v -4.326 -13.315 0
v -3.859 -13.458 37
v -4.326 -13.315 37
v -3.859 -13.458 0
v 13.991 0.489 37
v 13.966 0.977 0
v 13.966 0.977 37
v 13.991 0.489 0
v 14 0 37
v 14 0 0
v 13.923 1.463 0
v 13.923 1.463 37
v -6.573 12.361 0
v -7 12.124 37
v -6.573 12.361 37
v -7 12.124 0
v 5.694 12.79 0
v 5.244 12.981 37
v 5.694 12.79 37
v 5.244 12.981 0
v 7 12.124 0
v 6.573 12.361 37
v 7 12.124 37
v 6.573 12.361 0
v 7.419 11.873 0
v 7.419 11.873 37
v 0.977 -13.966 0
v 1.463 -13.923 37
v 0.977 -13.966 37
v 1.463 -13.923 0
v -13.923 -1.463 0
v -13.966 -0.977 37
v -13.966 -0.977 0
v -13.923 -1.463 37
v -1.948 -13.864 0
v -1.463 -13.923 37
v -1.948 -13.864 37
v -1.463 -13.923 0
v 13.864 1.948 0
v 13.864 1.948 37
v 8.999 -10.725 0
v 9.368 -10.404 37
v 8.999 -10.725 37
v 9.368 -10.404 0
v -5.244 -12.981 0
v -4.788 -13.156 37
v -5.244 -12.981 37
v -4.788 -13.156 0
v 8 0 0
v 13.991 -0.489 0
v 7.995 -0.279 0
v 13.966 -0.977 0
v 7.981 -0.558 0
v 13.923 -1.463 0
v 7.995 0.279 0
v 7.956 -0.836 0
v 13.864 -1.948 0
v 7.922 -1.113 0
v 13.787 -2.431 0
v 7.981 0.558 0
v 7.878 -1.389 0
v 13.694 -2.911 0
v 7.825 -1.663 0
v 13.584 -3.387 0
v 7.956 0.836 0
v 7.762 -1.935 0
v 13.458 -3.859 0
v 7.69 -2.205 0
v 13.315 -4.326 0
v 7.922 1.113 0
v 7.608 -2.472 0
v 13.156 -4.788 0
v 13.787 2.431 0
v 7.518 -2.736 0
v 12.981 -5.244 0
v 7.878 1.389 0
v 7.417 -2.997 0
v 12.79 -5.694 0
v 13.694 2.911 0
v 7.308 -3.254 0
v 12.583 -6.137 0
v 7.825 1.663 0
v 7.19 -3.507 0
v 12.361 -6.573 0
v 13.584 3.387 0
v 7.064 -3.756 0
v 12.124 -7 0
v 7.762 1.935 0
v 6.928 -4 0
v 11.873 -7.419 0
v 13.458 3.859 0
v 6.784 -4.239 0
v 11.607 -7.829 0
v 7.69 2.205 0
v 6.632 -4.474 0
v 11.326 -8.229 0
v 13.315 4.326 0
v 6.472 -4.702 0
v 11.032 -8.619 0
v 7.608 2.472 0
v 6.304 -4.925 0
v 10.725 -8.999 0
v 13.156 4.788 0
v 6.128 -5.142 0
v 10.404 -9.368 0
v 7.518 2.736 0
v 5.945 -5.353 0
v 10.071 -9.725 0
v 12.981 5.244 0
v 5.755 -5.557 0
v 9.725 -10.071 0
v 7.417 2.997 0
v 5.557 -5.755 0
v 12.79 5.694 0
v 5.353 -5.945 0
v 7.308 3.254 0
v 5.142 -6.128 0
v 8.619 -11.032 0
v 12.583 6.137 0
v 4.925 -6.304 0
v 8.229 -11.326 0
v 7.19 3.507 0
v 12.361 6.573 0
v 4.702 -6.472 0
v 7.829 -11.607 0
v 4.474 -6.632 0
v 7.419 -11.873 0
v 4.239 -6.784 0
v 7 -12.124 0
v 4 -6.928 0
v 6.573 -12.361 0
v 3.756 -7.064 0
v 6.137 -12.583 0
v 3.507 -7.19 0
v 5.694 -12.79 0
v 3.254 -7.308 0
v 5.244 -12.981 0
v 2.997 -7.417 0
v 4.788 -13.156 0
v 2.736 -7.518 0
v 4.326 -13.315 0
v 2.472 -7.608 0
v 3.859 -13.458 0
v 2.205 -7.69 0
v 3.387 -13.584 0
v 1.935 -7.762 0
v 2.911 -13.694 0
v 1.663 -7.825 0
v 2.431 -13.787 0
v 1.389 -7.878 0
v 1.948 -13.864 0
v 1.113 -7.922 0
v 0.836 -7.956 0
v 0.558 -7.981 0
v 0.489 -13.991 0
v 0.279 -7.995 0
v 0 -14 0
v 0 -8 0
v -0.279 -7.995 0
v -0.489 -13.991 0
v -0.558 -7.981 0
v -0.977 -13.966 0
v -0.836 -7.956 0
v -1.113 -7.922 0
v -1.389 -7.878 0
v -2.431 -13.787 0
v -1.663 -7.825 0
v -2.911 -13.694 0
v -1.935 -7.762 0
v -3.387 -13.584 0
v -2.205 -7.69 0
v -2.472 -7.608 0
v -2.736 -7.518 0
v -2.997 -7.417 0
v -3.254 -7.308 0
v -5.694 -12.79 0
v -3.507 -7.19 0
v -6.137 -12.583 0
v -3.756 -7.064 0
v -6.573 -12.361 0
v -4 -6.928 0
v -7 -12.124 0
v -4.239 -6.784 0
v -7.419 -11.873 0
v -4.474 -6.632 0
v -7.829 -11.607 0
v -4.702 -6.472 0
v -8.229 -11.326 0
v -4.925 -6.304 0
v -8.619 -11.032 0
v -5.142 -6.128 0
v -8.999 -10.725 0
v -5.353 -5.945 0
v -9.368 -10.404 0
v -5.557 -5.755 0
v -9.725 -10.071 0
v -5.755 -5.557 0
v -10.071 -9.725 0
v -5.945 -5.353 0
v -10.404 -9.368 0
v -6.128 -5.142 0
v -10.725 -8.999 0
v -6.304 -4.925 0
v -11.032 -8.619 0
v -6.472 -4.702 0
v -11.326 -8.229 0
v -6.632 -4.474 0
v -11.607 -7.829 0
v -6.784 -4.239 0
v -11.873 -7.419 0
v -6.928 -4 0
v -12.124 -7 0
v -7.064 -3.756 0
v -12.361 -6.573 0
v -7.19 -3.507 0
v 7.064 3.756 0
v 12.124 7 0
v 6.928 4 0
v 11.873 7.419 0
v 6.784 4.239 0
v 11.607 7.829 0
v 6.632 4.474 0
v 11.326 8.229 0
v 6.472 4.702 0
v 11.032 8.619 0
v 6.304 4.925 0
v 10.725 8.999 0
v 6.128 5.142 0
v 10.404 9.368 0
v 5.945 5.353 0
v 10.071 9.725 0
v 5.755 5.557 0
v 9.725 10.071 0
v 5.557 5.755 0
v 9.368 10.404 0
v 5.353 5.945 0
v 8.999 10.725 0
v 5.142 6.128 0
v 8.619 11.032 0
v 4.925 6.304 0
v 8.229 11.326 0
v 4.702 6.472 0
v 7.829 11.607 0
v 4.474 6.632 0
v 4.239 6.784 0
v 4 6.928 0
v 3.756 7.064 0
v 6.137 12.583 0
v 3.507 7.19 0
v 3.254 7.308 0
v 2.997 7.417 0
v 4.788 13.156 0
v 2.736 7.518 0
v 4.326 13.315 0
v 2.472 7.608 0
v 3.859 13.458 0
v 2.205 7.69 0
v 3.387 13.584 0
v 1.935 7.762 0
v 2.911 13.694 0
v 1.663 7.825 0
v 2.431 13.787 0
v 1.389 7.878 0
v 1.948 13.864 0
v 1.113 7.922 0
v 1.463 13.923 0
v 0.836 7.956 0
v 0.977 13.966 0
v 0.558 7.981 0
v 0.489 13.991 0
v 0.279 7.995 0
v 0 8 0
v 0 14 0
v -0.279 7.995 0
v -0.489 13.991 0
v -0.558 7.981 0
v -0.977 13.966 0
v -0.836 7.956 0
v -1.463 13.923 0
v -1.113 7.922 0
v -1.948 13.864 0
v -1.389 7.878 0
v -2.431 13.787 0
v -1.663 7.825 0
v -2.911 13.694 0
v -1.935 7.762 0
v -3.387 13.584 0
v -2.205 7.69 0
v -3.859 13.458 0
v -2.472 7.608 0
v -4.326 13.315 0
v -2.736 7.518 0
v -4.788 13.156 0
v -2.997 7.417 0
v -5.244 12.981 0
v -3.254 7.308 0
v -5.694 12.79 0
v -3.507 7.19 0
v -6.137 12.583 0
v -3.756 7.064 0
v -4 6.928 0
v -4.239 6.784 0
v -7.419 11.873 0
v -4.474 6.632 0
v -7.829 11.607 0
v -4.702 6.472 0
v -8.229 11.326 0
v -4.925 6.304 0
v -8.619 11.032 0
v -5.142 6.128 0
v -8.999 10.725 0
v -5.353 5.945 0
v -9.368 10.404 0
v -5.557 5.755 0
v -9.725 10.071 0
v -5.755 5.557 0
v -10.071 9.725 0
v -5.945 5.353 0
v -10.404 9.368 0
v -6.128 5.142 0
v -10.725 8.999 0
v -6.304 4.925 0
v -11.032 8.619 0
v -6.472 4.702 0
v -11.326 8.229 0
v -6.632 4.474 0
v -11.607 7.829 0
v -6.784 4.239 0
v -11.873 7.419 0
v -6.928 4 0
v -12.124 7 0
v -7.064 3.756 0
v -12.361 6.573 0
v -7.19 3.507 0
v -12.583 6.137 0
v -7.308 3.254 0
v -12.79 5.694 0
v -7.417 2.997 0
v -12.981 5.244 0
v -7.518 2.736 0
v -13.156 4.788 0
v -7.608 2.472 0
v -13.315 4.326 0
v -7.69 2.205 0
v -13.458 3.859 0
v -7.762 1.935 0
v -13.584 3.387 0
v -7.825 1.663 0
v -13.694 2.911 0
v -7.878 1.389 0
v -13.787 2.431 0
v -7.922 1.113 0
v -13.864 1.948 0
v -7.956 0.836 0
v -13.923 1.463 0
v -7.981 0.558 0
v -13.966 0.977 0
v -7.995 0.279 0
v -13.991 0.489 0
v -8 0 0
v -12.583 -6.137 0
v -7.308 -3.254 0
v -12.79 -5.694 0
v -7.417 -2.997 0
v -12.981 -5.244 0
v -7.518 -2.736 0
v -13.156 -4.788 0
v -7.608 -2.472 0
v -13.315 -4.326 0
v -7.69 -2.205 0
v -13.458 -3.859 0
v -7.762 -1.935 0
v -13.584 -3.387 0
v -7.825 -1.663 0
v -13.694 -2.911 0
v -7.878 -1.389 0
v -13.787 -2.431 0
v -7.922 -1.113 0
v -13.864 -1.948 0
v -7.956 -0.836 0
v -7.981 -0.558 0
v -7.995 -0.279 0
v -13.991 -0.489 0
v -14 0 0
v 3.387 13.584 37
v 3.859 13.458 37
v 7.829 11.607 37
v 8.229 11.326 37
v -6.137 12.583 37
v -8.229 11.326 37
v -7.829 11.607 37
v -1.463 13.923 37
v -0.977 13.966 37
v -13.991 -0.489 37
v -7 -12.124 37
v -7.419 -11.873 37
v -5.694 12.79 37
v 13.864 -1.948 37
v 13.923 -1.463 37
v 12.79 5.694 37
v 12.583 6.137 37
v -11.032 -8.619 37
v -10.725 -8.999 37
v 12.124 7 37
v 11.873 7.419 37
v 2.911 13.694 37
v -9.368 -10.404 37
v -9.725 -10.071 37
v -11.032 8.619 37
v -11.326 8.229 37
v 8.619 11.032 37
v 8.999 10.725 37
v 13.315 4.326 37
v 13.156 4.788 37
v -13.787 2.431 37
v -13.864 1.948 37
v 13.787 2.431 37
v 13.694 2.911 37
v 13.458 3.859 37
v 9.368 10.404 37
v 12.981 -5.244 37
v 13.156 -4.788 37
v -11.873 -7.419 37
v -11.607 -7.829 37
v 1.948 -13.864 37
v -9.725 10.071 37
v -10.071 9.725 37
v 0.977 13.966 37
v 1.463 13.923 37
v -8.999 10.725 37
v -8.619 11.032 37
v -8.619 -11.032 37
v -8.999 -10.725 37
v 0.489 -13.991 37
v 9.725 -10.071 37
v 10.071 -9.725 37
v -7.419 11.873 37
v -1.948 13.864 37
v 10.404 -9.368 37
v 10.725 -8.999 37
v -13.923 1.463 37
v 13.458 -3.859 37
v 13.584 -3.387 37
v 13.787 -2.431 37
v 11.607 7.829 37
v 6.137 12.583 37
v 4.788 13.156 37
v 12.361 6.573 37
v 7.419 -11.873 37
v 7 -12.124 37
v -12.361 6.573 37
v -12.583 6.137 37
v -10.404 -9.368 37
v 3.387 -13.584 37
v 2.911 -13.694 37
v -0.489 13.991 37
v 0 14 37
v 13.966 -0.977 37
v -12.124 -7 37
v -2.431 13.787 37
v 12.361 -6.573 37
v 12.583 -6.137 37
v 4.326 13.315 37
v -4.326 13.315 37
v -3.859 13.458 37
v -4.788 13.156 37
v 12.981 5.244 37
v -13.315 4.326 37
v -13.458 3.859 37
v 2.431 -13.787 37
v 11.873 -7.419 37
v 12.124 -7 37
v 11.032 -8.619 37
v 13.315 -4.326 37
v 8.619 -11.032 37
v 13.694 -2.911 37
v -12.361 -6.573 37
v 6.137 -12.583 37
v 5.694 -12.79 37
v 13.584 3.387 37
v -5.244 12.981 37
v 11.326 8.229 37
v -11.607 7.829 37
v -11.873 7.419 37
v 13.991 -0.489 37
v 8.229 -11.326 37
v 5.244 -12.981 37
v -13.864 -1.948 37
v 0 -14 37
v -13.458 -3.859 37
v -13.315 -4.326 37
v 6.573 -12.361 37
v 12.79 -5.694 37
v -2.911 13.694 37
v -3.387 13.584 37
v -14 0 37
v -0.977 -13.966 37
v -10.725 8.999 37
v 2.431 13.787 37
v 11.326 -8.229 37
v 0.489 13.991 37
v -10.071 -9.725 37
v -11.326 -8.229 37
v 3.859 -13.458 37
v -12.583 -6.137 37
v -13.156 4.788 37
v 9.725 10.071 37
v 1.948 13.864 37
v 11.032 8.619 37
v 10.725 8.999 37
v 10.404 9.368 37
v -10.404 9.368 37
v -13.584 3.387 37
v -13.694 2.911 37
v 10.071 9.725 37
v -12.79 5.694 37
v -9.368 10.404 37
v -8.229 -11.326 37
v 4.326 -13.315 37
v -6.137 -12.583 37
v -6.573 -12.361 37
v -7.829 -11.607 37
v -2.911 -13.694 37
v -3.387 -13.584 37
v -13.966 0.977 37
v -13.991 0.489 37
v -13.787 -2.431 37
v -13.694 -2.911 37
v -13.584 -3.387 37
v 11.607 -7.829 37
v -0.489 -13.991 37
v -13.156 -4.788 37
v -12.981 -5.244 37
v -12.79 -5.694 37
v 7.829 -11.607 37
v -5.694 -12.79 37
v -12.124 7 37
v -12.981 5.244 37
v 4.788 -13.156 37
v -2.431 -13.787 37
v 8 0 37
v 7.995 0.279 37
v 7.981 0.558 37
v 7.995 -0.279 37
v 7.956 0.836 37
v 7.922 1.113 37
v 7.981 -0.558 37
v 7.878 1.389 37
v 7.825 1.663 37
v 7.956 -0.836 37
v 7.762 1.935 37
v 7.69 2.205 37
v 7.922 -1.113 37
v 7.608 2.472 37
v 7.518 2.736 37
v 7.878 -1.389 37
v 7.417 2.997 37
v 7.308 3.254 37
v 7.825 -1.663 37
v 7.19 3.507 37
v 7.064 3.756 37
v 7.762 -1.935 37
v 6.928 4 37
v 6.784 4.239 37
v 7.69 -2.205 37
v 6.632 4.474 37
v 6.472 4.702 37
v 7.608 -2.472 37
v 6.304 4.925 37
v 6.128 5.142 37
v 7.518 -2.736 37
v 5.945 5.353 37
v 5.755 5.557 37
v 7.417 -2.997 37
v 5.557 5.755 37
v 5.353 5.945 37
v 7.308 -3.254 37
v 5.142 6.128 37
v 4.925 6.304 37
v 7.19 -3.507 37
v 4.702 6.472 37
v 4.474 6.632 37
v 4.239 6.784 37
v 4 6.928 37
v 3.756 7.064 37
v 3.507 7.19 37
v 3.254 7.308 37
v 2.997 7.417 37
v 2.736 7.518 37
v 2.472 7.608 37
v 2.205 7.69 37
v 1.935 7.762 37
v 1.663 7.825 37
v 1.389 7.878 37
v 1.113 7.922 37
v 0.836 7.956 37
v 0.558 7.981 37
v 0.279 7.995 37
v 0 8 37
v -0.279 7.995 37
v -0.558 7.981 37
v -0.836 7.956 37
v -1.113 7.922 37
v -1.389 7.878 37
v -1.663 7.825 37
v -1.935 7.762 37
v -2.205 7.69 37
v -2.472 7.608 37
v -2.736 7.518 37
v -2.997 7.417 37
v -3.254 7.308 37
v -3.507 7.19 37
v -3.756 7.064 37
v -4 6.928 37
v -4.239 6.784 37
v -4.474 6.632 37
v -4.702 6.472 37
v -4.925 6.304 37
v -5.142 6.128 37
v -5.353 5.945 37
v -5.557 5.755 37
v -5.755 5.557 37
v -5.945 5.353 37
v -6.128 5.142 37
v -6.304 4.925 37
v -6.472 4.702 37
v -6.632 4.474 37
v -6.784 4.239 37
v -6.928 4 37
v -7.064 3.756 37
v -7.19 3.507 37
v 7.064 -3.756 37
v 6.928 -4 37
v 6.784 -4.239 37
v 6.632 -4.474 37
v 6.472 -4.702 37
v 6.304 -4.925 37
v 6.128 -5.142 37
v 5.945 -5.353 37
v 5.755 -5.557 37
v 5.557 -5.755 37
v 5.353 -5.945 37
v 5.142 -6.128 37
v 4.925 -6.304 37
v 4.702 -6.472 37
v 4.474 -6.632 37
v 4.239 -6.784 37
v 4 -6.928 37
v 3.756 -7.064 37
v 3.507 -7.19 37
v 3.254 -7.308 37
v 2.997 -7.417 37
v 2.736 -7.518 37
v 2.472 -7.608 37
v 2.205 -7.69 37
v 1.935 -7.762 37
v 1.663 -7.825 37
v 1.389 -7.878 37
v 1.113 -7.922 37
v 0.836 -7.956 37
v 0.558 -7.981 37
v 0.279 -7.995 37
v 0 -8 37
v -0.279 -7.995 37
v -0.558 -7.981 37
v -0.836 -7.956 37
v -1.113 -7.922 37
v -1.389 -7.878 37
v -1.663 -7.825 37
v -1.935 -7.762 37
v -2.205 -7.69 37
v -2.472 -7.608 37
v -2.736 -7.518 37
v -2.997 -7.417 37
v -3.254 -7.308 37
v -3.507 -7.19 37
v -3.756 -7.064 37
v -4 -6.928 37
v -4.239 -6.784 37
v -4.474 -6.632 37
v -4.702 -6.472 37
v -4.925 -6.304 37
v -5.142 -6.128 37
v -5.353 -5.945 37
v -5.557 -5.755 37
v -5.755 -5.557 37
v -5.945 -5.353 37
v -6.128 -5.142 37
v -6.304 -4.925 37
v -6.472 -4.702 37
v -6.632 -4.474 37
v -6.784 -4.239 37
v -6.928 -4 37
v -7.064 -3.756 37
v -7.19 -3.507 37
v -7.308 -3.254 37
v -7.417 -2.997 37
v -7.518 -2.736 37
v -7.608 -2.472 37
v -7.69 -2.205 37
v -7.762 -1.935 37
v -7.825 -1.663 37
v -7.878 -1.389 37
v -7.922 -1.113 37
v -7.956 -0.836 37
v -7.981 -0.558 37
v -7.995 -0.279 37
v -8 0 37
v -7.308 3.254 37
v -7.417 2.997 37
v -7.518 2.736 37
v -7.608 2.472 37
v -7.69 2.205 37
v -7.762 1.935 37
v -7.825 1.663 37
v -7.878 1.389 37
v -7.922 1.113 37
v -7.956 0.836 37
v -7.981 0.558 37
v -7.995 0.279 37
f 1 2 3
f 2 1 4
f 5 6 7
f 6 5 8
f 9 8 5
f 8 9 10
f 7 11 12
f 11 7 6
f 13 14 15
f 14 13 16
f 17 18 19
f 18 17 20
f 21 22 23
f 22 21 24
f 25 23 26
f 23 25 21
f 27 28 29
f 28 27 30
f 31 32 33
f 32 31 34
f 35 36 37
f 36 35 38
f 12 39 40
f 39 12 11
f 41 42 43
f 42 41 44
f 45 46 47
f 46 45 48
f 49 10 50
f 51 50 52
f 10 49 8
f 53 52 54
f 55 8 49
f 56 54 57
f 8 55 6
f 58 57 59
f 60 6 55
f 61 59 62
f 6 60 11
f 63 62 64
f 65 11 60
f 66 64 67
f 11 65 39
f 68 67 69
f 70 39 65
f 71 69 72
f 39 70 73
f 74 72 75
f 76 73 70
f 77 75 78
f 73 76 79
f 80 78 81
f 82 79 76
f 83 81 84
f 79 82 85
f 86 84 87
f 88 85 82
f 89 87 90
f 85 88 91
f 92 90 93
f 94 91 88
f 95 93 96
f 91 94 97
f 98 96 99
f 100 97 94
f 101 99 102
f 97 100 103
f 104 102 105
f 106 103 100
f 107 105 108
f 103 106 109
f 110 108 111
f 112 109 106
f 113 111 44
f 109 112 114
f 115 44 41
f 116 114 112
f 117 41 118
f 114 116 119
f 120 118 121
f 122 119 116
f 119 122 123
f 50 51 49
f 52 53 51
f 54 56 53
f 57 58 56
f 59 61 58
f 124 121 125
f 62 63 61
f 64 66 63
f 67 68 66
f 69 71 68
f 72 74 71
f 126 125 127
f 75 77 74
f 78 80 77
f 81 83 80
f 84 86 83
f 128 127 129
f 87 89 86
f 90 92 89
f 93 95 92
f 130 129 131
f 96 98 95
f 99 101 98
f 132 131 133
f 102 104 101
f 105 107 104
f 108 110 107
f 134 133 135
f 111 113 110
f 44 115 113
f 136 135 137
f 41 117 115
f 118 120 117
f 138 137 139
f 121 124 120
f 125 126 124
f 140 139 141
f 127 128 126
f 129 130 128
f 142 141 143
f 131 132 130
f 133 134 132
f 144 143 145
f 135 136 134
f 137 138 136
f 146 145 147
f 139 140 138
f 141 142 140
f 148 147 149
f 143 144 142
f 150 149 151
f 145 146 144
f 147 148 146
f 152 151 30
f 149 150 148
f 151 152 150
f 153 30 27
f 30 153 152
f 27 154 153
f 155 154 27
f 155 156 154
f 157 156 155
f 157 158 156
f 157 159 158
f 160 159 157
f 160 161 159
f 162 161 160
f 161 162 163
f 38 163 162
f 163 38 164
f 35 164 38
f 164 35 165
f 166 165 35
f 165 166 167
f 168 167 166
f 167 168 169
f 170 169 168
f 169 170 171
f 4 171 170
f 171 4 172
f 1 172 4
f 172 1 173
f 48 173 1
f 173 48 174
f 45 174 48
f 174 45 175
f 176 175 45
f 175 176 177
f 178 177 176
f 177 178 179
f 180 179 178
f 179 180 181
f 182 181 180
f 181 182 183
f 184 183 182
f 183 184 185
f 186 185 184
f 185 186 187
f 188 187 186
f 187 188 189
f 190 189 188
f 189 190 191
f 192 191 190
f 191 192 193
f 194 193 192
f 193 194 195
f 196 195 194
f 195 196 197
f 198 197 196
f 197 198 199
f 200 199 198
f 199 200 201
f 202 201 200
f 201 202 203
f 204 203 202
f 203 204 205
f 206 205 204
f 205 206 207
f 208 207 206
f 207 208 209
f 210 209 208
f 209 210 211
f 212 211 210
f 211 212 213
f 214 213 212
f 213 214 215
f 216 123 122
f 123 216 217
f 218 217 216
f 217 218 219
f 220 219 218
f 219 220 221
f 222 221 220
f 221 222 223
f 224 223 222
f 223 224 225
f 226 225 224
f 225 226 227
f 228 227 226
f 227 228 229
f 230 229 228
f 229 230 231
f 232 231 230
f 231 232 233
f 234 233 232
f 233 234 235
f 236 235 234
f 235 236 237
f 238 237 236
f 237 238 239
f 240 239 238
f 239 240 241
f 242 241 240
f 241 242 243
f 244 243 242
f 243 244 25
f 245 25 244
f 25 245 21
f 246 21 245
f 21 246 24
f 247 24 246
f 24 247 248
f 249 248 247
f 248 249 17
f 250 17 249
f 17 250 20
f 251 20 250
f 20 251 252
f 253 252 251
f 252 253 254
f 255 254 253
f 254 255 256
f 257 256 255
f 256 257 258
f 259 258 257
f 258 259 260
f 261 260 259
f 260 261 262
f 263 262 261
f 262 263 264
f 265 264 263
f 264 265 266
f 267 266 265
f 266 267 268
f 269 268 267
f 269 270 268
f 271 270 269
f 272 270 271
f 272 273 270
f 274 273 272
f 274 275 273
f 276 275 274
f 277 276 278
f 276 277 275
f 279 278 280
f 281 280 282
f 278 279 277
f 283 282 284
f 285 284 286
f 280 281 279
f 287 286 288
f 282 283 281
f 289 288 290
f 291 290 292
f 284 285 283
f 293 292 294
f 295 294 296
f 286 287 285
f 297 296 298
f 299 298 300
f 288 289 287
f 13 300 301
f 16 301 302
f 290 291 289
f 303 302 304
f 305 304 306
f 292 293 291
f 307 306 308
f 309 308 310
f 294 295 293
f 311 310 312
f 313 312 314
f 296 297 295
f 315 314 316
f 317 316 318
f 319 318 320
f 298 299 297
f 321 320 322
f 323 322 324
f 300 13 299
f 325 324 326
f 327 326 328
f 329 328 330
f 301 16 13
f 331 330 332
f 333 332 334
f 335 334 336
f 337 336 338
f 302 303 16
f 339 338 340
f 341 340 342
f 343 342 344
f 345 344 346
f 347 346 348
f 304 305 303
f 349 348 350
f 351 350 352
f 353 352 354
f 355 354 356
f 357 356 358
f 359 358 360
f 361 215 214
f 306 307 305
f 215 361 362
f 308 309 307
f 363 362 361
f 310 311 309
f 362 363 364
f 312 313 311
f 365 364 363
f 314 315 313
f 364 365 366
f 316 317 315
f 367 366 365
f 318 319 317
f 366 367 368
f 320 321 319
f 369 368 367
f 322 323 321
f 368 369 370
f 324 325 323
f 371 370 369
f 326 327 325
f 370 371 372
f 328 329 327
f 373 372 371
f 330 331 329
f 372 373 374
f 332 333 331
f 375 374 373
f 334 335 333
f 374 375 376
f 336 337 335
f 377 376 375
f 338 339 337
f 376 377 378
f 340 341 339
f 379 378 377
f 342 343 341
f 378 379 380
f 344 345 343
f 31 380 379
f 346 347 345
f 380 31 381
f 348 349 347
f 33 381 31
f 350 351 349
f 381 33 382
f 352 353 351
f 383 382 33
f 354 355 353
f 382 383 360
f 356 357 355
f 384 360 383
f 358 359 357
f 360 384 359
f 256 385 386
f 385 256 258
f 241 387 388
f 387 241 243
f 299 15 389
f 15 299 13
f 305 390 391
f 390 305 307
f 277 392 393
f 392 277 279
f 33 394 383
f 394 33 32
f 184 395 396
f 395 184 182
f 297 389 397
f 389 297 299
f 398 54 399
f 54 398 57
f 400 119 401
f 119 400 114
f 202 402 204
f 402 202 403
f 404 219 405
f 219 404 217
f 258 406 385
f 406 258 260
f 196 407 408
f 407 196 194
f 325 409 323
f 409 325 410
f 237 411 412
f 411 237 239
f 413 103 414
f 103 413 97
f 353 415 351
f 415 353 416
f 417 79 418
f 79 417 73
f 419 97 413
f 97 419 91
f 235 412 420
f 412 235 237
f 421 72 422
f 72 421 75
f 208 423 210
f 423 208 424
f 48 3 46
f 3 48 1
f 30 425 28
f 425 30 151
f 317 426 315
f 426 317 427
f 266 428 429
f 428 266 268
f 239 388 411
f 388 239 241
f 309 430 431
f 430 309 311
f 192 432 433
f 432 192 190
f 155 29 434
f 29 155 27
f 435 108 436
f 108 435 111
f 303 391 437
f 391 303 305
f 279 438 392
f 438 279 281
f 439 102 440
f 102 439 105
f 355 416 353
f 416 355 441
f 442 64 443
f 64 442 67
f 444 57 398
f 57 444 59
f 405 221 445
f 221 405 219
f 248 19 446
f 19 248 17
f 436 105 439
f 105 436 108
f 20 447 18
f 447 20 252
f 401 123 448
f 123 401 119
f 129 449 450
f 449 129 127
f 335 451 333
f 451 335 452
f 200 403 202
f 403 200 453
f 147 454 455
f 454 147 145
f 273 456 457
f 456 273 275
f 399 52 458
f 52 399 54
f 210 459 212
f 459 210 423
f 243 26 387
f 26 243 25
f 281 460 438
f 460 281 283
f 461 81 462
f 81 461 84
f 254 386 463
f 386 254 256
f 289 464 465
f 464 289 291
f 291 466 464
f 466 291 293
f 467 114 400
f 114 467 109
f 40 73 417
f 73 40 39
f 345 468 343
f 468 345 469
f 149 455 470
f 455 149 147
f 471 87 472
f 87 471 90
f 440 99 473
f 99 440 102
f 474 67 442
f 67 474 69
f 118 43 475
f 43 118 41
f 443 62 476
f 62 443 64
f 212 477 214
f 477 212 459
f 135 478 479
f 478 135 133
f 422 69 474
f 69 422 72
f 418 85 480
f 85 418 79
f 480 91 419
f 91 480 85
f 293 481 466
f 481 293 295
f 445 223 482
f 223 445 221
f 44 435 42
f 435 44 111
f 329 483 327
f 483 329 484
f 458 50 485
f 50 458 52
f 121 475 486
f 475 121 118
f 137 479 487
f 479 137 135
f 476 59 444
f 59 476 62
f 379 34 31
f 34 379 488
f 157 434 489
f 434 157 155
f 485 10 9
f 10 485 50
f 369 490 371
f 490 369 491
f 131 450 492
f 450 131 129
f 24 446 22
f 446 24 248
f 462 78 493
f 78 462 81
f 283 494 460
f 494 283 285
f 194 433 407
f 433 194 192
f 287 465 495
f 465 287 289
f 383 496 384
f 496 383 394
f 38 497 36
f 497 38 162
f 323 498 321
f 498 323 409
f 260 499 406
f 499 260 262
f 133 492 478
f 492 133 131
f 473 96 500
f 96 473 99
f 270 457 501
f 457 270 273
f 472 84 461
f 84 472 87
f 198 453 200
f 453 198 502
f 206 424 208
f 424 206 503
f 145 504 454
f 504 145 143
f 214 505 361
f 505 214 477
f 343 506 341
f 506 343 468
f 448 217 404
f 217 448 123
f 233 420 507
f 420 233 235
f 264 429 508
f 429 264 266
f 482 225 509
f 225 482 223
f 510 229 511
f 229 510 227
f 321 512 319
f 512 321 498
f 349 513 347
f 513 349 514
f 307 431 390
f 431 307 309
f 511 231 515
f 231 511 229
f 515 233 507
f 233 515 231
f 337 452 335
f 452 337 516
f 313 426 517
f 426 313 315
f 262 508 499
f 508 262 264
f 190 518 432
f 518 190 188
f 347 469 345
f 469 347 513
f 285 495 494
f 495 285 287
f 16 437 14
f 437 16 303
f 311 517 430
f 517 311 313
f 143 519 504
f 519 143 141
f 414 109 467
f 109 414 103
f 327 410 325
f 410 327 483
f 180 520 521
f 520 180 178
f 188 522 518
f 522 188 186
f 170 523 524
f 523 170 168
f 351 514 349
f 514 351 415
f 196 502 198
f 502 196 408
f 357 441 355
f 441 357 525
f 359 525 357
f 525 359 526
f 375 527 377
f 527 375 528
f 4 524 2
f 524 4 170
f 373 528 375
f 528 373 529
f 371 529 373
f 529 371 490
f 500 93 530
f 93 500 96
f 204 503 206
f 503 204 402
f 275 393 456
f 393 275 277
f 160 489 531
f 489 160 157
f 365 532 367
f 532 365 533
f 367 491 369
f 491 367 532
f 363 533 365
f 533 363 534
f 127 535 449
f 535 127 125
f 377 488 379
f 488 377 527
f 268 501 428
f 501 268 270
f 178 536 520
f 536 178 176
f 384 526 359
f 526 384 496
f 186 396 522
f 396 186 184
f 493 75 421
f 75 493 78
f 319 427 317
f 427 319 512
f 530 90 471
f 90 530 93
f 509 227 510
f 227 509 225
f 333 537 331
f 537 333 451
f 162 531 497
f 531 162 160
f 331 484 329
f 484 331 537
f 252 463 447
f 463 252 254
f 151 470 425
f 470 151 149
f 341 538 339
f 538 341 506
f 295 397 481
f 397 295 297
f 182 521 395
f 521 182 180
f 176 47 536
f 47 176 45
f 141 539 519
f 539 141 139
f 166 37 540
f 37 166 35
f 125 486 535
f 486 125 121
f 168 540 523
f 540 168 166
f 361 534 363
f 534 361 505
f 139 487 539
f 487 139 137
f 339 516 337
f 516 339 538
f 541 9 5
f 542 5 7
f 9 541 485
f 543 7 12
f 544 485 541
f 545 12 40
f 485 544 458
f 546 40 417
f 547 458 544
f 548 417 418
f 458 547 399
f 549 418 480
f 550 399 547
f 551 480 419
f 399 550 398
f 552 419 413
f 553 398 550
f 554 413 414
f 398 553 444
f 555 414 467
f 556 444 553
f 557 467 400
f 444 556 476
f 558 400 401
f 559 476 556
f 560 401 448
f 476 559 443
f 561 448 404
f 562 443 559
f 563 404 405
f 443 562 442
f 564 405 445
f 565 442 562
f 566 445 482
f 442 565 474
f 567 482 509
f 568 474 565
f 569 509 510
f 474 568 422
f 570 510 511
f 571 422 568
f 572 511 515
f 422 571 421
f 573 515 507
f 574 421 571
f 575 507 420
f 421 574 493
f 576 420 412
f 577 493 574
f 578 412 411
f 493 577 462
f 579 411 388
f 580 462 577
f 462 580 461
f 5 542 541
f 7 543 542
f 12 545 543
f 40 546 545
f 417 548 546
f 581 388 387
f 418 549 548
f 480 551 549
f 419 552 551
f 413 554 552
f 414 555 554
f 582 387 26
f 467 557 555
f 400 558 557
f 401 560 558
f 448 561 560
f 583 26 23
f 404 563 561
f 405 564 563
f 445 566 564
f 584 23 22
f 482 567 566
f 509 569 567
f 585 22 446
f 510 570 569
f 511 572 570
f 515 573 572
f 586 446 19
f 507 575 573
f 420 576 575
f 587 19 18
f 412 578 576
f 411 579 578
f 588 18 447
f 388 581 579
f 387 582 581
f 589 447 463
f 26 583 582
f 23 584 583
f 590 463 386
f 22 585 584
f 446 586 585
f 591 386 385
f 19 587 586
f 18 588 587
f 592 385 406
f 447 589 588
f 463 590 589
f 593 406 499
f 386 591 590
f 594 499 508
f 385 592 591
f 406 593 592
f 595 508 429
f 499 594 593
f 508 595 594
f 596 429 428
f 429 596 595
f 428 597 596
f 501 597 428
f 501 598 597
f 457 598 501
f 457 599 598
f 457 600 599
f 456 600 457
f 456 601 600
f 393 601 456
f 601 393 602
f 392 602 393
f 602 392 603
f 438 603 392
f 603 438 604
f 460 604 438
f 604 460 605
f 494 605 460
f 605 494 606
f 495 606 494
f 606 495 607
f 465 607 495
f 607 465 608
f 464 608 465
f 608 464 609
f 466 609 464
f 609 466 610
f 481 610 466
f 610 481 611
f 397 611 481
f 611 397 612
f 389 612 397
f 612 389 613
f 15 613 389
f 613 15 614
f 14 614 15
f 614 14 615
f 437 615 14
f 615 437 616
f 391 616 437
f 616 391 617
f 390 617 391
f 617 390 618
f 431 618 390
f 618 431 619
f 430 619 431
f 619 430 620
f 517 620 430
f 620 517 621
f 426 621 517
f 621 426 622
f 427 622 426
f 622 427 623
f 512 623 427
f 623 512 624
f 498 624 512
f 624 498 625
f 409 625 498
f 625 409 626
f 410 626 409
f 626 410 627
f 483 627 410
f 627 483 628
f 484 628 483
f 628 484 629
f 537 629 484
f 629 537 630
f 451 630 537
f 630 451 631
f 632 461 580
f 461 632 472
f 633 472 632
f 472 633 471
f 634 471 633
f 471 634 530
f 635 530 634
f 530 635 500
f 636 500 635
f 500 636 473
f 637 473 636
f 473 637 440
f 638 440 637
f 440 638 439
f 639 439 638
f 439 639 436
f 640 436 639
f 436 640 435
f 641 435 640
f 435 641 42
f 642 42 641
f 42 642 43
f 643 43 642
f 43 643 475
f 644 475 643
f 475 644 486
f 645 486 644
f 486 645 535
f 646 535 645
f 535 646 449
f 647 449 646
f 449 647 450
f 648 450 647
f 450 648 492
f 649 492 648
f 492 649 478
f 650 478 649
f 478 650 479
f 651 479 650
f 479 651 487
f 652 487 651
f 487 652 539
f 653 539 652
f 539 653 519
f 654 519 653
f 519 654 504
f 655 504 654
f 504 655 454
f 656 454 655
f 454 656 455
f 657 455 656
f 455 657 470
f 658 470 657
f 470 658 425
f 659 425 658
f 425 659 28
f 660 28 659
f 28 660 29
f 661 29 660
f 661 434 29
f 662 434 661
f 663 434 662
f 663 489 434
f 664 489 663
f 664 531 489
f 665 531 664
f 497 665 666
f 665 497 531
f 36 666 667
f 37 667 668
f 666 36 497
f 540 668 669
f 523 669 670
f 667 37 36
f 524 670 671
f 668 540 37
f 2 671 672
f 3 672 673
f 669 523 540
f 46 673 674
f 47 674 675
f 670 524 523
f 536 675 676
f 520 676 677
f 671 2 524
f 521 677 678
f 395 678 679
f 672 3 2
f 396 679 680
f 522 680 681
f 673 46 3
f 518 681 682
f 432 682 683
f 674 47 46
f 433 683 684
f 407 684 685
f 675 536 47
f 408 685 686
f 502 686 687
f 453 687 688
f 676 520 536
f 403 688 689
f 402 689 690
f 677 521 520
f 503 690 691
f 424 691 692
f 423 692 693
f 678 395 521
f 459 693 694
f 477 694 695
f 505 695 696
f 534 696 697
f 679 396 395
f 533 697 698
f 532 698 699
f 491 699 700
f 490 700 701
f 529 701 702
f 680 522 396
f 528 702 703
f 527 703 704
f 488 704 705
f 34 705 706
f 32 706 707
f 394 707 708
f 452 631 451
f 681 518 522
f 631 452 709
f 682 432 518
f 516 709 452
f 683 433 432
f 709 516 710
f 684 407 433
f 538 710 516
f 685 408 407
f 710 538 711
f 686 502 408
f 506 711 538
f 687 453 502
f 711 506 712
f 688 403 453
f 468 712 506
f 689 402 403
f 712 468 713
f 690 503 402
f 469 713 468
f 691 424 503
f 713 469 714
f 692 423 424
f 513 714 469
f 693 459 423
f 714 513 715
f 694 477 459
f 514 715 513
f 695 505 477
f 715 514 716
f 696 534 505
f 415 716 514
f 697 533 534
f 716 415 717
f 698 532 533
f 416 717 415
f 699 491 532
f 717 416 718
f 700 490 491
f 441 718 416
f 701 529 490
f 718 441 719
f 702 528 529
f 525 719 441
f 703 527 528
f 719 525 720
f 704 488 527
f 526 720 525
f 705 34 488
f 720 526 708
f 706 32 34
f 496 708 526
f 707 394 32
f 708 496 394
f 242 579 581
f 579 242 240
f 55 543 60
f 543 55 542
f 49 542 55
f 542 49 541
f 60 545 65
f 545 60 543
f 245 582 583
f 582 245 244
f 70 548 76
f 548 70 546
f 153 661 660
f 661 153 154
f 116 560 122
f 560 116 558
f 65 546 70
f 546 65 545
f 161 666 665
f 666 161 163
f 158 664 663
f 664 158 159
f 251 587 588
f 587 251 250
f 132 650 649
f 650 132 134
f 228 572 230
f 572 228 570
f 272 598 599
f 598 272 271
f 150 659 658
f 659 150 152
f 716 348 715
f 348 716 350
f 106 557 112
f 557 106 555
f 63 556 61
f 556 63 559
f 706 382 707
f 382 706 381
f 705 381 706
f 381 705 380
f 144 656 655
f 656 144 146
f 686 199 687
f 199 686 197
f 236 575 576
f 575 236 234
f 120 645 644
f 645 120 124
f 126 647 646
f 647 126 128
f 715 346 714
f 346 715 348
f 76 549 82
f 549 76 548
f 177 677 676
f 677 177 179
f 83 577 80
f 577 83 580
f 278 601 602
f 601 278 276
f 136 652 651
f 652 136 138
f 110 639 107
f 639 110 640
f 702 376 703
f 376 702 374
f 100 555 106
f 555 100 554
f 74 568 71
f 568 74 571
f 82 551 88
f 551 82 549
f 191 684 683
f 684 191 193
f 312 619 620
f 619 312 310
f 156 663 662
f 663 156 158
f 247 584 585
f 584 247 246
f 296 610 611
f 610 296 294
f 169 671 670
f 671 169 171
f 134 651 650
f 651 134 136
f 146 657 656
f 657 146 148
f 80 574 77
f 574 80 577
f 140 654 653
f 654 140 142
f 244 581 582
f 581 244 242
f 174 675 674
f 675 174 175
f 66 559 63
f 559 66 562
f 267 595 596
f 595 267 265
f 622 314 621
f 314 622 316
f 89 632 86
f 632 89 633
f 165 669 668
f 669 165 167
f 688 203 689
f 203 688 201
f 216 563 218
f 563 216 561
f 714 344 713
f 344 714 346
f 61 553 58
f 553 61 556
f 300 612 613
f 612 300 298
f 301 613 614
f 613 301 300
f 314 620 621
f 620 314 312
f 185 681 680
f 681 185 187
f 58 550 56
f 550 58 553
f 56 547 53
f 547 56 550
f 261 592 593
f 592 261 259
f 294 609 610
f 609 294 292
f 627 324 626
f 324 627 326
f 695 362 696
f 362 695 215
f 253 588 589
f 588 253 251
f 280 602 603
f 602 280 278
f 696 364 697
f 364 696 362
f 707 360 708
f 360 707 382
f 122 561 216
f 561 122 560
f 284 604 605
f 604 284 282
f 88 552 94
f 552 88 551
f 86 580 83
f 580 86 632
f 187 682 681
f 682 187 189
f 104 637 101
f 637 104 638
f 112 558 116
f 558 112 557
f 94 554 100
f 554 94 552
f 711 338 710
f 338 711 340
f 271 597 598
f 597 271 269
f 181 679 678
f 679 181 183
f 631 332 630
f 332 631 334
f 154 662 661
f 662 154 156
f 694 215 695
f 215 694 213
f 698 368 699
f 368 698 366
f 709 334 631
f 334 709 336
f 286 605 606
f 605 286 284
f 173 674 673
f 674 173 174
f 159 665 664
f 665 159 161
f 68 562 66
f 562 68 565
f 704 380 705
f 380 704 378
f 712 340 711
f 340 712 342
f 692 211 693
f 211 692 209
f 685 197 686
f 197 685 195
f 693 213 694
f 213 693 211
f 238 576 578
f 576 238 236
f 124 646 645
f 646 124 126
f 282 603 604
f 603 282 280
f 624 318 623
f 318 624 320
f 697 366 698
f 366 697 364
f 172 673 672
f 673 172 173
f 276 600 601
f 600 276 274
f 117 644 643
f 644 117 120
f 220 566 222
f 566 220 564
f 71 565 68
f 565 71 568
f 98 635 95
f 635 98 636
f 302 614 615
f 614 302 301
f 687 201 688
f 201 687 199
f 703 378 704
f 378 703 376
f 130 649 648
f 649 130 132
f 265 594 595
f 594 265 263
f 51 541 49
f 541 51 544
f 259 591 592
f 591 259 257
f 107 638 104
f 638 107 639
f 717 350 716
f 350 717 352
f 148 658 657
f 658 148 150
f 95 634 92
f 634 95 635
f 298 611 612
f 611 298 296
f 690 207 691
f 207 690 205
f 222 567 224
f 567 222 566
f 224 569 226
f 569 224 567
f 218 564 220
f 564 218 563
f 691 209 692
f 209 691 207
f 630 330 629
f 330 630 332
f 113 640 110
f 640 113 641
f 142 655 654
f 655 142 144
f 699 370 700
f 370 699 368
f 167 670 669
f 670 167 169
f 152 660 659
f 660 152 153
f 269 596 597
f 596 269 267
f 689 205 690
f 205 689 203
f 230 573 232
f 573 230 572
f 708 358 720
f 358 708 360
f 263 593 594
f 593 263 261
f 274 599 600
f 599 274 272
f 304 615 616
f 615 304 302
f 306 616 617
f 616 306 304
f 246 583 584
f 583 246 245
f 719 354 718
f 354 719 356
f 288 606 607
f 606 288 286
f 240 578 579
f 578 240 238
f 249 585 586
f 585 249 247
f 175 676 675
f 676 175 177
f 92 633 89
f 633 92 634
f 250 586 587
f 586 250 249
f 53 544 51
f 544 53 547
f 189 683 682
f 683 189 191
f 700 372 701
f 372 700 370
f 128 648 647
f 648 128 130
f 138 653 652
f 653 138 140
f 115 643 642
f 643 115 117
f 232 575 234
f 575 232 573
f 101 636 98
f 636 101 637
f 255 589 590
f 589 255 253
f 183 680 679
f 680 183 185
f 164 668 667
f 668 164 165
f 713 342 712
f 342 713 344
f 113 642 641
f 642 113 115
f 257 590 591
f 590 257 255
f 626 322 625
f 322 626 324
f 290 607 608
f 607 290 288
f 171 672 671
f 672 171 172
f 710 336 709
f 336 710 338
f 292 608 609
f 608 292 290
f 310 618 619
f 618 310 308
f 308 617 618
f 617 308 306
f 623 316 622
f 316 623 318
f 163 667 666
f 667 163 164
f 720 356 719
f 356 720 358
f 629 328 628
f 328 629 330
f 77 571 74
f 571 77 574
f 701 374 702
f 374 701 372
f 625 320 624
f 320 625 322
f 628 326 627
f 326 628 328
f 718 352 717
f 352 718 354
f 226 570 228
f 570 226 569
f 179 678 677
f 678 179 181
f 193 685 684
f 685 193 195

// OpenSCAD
$fn = 180;

bore_d = 16.0;
od_d   = 28.0;
len    = 37.0;

difference() {
  cylinder(d=od_d, h=len, center=false);
  translate([0,0,-0.1]) cylinder(d=bore_d, h=len+0.2, center=false);
}
